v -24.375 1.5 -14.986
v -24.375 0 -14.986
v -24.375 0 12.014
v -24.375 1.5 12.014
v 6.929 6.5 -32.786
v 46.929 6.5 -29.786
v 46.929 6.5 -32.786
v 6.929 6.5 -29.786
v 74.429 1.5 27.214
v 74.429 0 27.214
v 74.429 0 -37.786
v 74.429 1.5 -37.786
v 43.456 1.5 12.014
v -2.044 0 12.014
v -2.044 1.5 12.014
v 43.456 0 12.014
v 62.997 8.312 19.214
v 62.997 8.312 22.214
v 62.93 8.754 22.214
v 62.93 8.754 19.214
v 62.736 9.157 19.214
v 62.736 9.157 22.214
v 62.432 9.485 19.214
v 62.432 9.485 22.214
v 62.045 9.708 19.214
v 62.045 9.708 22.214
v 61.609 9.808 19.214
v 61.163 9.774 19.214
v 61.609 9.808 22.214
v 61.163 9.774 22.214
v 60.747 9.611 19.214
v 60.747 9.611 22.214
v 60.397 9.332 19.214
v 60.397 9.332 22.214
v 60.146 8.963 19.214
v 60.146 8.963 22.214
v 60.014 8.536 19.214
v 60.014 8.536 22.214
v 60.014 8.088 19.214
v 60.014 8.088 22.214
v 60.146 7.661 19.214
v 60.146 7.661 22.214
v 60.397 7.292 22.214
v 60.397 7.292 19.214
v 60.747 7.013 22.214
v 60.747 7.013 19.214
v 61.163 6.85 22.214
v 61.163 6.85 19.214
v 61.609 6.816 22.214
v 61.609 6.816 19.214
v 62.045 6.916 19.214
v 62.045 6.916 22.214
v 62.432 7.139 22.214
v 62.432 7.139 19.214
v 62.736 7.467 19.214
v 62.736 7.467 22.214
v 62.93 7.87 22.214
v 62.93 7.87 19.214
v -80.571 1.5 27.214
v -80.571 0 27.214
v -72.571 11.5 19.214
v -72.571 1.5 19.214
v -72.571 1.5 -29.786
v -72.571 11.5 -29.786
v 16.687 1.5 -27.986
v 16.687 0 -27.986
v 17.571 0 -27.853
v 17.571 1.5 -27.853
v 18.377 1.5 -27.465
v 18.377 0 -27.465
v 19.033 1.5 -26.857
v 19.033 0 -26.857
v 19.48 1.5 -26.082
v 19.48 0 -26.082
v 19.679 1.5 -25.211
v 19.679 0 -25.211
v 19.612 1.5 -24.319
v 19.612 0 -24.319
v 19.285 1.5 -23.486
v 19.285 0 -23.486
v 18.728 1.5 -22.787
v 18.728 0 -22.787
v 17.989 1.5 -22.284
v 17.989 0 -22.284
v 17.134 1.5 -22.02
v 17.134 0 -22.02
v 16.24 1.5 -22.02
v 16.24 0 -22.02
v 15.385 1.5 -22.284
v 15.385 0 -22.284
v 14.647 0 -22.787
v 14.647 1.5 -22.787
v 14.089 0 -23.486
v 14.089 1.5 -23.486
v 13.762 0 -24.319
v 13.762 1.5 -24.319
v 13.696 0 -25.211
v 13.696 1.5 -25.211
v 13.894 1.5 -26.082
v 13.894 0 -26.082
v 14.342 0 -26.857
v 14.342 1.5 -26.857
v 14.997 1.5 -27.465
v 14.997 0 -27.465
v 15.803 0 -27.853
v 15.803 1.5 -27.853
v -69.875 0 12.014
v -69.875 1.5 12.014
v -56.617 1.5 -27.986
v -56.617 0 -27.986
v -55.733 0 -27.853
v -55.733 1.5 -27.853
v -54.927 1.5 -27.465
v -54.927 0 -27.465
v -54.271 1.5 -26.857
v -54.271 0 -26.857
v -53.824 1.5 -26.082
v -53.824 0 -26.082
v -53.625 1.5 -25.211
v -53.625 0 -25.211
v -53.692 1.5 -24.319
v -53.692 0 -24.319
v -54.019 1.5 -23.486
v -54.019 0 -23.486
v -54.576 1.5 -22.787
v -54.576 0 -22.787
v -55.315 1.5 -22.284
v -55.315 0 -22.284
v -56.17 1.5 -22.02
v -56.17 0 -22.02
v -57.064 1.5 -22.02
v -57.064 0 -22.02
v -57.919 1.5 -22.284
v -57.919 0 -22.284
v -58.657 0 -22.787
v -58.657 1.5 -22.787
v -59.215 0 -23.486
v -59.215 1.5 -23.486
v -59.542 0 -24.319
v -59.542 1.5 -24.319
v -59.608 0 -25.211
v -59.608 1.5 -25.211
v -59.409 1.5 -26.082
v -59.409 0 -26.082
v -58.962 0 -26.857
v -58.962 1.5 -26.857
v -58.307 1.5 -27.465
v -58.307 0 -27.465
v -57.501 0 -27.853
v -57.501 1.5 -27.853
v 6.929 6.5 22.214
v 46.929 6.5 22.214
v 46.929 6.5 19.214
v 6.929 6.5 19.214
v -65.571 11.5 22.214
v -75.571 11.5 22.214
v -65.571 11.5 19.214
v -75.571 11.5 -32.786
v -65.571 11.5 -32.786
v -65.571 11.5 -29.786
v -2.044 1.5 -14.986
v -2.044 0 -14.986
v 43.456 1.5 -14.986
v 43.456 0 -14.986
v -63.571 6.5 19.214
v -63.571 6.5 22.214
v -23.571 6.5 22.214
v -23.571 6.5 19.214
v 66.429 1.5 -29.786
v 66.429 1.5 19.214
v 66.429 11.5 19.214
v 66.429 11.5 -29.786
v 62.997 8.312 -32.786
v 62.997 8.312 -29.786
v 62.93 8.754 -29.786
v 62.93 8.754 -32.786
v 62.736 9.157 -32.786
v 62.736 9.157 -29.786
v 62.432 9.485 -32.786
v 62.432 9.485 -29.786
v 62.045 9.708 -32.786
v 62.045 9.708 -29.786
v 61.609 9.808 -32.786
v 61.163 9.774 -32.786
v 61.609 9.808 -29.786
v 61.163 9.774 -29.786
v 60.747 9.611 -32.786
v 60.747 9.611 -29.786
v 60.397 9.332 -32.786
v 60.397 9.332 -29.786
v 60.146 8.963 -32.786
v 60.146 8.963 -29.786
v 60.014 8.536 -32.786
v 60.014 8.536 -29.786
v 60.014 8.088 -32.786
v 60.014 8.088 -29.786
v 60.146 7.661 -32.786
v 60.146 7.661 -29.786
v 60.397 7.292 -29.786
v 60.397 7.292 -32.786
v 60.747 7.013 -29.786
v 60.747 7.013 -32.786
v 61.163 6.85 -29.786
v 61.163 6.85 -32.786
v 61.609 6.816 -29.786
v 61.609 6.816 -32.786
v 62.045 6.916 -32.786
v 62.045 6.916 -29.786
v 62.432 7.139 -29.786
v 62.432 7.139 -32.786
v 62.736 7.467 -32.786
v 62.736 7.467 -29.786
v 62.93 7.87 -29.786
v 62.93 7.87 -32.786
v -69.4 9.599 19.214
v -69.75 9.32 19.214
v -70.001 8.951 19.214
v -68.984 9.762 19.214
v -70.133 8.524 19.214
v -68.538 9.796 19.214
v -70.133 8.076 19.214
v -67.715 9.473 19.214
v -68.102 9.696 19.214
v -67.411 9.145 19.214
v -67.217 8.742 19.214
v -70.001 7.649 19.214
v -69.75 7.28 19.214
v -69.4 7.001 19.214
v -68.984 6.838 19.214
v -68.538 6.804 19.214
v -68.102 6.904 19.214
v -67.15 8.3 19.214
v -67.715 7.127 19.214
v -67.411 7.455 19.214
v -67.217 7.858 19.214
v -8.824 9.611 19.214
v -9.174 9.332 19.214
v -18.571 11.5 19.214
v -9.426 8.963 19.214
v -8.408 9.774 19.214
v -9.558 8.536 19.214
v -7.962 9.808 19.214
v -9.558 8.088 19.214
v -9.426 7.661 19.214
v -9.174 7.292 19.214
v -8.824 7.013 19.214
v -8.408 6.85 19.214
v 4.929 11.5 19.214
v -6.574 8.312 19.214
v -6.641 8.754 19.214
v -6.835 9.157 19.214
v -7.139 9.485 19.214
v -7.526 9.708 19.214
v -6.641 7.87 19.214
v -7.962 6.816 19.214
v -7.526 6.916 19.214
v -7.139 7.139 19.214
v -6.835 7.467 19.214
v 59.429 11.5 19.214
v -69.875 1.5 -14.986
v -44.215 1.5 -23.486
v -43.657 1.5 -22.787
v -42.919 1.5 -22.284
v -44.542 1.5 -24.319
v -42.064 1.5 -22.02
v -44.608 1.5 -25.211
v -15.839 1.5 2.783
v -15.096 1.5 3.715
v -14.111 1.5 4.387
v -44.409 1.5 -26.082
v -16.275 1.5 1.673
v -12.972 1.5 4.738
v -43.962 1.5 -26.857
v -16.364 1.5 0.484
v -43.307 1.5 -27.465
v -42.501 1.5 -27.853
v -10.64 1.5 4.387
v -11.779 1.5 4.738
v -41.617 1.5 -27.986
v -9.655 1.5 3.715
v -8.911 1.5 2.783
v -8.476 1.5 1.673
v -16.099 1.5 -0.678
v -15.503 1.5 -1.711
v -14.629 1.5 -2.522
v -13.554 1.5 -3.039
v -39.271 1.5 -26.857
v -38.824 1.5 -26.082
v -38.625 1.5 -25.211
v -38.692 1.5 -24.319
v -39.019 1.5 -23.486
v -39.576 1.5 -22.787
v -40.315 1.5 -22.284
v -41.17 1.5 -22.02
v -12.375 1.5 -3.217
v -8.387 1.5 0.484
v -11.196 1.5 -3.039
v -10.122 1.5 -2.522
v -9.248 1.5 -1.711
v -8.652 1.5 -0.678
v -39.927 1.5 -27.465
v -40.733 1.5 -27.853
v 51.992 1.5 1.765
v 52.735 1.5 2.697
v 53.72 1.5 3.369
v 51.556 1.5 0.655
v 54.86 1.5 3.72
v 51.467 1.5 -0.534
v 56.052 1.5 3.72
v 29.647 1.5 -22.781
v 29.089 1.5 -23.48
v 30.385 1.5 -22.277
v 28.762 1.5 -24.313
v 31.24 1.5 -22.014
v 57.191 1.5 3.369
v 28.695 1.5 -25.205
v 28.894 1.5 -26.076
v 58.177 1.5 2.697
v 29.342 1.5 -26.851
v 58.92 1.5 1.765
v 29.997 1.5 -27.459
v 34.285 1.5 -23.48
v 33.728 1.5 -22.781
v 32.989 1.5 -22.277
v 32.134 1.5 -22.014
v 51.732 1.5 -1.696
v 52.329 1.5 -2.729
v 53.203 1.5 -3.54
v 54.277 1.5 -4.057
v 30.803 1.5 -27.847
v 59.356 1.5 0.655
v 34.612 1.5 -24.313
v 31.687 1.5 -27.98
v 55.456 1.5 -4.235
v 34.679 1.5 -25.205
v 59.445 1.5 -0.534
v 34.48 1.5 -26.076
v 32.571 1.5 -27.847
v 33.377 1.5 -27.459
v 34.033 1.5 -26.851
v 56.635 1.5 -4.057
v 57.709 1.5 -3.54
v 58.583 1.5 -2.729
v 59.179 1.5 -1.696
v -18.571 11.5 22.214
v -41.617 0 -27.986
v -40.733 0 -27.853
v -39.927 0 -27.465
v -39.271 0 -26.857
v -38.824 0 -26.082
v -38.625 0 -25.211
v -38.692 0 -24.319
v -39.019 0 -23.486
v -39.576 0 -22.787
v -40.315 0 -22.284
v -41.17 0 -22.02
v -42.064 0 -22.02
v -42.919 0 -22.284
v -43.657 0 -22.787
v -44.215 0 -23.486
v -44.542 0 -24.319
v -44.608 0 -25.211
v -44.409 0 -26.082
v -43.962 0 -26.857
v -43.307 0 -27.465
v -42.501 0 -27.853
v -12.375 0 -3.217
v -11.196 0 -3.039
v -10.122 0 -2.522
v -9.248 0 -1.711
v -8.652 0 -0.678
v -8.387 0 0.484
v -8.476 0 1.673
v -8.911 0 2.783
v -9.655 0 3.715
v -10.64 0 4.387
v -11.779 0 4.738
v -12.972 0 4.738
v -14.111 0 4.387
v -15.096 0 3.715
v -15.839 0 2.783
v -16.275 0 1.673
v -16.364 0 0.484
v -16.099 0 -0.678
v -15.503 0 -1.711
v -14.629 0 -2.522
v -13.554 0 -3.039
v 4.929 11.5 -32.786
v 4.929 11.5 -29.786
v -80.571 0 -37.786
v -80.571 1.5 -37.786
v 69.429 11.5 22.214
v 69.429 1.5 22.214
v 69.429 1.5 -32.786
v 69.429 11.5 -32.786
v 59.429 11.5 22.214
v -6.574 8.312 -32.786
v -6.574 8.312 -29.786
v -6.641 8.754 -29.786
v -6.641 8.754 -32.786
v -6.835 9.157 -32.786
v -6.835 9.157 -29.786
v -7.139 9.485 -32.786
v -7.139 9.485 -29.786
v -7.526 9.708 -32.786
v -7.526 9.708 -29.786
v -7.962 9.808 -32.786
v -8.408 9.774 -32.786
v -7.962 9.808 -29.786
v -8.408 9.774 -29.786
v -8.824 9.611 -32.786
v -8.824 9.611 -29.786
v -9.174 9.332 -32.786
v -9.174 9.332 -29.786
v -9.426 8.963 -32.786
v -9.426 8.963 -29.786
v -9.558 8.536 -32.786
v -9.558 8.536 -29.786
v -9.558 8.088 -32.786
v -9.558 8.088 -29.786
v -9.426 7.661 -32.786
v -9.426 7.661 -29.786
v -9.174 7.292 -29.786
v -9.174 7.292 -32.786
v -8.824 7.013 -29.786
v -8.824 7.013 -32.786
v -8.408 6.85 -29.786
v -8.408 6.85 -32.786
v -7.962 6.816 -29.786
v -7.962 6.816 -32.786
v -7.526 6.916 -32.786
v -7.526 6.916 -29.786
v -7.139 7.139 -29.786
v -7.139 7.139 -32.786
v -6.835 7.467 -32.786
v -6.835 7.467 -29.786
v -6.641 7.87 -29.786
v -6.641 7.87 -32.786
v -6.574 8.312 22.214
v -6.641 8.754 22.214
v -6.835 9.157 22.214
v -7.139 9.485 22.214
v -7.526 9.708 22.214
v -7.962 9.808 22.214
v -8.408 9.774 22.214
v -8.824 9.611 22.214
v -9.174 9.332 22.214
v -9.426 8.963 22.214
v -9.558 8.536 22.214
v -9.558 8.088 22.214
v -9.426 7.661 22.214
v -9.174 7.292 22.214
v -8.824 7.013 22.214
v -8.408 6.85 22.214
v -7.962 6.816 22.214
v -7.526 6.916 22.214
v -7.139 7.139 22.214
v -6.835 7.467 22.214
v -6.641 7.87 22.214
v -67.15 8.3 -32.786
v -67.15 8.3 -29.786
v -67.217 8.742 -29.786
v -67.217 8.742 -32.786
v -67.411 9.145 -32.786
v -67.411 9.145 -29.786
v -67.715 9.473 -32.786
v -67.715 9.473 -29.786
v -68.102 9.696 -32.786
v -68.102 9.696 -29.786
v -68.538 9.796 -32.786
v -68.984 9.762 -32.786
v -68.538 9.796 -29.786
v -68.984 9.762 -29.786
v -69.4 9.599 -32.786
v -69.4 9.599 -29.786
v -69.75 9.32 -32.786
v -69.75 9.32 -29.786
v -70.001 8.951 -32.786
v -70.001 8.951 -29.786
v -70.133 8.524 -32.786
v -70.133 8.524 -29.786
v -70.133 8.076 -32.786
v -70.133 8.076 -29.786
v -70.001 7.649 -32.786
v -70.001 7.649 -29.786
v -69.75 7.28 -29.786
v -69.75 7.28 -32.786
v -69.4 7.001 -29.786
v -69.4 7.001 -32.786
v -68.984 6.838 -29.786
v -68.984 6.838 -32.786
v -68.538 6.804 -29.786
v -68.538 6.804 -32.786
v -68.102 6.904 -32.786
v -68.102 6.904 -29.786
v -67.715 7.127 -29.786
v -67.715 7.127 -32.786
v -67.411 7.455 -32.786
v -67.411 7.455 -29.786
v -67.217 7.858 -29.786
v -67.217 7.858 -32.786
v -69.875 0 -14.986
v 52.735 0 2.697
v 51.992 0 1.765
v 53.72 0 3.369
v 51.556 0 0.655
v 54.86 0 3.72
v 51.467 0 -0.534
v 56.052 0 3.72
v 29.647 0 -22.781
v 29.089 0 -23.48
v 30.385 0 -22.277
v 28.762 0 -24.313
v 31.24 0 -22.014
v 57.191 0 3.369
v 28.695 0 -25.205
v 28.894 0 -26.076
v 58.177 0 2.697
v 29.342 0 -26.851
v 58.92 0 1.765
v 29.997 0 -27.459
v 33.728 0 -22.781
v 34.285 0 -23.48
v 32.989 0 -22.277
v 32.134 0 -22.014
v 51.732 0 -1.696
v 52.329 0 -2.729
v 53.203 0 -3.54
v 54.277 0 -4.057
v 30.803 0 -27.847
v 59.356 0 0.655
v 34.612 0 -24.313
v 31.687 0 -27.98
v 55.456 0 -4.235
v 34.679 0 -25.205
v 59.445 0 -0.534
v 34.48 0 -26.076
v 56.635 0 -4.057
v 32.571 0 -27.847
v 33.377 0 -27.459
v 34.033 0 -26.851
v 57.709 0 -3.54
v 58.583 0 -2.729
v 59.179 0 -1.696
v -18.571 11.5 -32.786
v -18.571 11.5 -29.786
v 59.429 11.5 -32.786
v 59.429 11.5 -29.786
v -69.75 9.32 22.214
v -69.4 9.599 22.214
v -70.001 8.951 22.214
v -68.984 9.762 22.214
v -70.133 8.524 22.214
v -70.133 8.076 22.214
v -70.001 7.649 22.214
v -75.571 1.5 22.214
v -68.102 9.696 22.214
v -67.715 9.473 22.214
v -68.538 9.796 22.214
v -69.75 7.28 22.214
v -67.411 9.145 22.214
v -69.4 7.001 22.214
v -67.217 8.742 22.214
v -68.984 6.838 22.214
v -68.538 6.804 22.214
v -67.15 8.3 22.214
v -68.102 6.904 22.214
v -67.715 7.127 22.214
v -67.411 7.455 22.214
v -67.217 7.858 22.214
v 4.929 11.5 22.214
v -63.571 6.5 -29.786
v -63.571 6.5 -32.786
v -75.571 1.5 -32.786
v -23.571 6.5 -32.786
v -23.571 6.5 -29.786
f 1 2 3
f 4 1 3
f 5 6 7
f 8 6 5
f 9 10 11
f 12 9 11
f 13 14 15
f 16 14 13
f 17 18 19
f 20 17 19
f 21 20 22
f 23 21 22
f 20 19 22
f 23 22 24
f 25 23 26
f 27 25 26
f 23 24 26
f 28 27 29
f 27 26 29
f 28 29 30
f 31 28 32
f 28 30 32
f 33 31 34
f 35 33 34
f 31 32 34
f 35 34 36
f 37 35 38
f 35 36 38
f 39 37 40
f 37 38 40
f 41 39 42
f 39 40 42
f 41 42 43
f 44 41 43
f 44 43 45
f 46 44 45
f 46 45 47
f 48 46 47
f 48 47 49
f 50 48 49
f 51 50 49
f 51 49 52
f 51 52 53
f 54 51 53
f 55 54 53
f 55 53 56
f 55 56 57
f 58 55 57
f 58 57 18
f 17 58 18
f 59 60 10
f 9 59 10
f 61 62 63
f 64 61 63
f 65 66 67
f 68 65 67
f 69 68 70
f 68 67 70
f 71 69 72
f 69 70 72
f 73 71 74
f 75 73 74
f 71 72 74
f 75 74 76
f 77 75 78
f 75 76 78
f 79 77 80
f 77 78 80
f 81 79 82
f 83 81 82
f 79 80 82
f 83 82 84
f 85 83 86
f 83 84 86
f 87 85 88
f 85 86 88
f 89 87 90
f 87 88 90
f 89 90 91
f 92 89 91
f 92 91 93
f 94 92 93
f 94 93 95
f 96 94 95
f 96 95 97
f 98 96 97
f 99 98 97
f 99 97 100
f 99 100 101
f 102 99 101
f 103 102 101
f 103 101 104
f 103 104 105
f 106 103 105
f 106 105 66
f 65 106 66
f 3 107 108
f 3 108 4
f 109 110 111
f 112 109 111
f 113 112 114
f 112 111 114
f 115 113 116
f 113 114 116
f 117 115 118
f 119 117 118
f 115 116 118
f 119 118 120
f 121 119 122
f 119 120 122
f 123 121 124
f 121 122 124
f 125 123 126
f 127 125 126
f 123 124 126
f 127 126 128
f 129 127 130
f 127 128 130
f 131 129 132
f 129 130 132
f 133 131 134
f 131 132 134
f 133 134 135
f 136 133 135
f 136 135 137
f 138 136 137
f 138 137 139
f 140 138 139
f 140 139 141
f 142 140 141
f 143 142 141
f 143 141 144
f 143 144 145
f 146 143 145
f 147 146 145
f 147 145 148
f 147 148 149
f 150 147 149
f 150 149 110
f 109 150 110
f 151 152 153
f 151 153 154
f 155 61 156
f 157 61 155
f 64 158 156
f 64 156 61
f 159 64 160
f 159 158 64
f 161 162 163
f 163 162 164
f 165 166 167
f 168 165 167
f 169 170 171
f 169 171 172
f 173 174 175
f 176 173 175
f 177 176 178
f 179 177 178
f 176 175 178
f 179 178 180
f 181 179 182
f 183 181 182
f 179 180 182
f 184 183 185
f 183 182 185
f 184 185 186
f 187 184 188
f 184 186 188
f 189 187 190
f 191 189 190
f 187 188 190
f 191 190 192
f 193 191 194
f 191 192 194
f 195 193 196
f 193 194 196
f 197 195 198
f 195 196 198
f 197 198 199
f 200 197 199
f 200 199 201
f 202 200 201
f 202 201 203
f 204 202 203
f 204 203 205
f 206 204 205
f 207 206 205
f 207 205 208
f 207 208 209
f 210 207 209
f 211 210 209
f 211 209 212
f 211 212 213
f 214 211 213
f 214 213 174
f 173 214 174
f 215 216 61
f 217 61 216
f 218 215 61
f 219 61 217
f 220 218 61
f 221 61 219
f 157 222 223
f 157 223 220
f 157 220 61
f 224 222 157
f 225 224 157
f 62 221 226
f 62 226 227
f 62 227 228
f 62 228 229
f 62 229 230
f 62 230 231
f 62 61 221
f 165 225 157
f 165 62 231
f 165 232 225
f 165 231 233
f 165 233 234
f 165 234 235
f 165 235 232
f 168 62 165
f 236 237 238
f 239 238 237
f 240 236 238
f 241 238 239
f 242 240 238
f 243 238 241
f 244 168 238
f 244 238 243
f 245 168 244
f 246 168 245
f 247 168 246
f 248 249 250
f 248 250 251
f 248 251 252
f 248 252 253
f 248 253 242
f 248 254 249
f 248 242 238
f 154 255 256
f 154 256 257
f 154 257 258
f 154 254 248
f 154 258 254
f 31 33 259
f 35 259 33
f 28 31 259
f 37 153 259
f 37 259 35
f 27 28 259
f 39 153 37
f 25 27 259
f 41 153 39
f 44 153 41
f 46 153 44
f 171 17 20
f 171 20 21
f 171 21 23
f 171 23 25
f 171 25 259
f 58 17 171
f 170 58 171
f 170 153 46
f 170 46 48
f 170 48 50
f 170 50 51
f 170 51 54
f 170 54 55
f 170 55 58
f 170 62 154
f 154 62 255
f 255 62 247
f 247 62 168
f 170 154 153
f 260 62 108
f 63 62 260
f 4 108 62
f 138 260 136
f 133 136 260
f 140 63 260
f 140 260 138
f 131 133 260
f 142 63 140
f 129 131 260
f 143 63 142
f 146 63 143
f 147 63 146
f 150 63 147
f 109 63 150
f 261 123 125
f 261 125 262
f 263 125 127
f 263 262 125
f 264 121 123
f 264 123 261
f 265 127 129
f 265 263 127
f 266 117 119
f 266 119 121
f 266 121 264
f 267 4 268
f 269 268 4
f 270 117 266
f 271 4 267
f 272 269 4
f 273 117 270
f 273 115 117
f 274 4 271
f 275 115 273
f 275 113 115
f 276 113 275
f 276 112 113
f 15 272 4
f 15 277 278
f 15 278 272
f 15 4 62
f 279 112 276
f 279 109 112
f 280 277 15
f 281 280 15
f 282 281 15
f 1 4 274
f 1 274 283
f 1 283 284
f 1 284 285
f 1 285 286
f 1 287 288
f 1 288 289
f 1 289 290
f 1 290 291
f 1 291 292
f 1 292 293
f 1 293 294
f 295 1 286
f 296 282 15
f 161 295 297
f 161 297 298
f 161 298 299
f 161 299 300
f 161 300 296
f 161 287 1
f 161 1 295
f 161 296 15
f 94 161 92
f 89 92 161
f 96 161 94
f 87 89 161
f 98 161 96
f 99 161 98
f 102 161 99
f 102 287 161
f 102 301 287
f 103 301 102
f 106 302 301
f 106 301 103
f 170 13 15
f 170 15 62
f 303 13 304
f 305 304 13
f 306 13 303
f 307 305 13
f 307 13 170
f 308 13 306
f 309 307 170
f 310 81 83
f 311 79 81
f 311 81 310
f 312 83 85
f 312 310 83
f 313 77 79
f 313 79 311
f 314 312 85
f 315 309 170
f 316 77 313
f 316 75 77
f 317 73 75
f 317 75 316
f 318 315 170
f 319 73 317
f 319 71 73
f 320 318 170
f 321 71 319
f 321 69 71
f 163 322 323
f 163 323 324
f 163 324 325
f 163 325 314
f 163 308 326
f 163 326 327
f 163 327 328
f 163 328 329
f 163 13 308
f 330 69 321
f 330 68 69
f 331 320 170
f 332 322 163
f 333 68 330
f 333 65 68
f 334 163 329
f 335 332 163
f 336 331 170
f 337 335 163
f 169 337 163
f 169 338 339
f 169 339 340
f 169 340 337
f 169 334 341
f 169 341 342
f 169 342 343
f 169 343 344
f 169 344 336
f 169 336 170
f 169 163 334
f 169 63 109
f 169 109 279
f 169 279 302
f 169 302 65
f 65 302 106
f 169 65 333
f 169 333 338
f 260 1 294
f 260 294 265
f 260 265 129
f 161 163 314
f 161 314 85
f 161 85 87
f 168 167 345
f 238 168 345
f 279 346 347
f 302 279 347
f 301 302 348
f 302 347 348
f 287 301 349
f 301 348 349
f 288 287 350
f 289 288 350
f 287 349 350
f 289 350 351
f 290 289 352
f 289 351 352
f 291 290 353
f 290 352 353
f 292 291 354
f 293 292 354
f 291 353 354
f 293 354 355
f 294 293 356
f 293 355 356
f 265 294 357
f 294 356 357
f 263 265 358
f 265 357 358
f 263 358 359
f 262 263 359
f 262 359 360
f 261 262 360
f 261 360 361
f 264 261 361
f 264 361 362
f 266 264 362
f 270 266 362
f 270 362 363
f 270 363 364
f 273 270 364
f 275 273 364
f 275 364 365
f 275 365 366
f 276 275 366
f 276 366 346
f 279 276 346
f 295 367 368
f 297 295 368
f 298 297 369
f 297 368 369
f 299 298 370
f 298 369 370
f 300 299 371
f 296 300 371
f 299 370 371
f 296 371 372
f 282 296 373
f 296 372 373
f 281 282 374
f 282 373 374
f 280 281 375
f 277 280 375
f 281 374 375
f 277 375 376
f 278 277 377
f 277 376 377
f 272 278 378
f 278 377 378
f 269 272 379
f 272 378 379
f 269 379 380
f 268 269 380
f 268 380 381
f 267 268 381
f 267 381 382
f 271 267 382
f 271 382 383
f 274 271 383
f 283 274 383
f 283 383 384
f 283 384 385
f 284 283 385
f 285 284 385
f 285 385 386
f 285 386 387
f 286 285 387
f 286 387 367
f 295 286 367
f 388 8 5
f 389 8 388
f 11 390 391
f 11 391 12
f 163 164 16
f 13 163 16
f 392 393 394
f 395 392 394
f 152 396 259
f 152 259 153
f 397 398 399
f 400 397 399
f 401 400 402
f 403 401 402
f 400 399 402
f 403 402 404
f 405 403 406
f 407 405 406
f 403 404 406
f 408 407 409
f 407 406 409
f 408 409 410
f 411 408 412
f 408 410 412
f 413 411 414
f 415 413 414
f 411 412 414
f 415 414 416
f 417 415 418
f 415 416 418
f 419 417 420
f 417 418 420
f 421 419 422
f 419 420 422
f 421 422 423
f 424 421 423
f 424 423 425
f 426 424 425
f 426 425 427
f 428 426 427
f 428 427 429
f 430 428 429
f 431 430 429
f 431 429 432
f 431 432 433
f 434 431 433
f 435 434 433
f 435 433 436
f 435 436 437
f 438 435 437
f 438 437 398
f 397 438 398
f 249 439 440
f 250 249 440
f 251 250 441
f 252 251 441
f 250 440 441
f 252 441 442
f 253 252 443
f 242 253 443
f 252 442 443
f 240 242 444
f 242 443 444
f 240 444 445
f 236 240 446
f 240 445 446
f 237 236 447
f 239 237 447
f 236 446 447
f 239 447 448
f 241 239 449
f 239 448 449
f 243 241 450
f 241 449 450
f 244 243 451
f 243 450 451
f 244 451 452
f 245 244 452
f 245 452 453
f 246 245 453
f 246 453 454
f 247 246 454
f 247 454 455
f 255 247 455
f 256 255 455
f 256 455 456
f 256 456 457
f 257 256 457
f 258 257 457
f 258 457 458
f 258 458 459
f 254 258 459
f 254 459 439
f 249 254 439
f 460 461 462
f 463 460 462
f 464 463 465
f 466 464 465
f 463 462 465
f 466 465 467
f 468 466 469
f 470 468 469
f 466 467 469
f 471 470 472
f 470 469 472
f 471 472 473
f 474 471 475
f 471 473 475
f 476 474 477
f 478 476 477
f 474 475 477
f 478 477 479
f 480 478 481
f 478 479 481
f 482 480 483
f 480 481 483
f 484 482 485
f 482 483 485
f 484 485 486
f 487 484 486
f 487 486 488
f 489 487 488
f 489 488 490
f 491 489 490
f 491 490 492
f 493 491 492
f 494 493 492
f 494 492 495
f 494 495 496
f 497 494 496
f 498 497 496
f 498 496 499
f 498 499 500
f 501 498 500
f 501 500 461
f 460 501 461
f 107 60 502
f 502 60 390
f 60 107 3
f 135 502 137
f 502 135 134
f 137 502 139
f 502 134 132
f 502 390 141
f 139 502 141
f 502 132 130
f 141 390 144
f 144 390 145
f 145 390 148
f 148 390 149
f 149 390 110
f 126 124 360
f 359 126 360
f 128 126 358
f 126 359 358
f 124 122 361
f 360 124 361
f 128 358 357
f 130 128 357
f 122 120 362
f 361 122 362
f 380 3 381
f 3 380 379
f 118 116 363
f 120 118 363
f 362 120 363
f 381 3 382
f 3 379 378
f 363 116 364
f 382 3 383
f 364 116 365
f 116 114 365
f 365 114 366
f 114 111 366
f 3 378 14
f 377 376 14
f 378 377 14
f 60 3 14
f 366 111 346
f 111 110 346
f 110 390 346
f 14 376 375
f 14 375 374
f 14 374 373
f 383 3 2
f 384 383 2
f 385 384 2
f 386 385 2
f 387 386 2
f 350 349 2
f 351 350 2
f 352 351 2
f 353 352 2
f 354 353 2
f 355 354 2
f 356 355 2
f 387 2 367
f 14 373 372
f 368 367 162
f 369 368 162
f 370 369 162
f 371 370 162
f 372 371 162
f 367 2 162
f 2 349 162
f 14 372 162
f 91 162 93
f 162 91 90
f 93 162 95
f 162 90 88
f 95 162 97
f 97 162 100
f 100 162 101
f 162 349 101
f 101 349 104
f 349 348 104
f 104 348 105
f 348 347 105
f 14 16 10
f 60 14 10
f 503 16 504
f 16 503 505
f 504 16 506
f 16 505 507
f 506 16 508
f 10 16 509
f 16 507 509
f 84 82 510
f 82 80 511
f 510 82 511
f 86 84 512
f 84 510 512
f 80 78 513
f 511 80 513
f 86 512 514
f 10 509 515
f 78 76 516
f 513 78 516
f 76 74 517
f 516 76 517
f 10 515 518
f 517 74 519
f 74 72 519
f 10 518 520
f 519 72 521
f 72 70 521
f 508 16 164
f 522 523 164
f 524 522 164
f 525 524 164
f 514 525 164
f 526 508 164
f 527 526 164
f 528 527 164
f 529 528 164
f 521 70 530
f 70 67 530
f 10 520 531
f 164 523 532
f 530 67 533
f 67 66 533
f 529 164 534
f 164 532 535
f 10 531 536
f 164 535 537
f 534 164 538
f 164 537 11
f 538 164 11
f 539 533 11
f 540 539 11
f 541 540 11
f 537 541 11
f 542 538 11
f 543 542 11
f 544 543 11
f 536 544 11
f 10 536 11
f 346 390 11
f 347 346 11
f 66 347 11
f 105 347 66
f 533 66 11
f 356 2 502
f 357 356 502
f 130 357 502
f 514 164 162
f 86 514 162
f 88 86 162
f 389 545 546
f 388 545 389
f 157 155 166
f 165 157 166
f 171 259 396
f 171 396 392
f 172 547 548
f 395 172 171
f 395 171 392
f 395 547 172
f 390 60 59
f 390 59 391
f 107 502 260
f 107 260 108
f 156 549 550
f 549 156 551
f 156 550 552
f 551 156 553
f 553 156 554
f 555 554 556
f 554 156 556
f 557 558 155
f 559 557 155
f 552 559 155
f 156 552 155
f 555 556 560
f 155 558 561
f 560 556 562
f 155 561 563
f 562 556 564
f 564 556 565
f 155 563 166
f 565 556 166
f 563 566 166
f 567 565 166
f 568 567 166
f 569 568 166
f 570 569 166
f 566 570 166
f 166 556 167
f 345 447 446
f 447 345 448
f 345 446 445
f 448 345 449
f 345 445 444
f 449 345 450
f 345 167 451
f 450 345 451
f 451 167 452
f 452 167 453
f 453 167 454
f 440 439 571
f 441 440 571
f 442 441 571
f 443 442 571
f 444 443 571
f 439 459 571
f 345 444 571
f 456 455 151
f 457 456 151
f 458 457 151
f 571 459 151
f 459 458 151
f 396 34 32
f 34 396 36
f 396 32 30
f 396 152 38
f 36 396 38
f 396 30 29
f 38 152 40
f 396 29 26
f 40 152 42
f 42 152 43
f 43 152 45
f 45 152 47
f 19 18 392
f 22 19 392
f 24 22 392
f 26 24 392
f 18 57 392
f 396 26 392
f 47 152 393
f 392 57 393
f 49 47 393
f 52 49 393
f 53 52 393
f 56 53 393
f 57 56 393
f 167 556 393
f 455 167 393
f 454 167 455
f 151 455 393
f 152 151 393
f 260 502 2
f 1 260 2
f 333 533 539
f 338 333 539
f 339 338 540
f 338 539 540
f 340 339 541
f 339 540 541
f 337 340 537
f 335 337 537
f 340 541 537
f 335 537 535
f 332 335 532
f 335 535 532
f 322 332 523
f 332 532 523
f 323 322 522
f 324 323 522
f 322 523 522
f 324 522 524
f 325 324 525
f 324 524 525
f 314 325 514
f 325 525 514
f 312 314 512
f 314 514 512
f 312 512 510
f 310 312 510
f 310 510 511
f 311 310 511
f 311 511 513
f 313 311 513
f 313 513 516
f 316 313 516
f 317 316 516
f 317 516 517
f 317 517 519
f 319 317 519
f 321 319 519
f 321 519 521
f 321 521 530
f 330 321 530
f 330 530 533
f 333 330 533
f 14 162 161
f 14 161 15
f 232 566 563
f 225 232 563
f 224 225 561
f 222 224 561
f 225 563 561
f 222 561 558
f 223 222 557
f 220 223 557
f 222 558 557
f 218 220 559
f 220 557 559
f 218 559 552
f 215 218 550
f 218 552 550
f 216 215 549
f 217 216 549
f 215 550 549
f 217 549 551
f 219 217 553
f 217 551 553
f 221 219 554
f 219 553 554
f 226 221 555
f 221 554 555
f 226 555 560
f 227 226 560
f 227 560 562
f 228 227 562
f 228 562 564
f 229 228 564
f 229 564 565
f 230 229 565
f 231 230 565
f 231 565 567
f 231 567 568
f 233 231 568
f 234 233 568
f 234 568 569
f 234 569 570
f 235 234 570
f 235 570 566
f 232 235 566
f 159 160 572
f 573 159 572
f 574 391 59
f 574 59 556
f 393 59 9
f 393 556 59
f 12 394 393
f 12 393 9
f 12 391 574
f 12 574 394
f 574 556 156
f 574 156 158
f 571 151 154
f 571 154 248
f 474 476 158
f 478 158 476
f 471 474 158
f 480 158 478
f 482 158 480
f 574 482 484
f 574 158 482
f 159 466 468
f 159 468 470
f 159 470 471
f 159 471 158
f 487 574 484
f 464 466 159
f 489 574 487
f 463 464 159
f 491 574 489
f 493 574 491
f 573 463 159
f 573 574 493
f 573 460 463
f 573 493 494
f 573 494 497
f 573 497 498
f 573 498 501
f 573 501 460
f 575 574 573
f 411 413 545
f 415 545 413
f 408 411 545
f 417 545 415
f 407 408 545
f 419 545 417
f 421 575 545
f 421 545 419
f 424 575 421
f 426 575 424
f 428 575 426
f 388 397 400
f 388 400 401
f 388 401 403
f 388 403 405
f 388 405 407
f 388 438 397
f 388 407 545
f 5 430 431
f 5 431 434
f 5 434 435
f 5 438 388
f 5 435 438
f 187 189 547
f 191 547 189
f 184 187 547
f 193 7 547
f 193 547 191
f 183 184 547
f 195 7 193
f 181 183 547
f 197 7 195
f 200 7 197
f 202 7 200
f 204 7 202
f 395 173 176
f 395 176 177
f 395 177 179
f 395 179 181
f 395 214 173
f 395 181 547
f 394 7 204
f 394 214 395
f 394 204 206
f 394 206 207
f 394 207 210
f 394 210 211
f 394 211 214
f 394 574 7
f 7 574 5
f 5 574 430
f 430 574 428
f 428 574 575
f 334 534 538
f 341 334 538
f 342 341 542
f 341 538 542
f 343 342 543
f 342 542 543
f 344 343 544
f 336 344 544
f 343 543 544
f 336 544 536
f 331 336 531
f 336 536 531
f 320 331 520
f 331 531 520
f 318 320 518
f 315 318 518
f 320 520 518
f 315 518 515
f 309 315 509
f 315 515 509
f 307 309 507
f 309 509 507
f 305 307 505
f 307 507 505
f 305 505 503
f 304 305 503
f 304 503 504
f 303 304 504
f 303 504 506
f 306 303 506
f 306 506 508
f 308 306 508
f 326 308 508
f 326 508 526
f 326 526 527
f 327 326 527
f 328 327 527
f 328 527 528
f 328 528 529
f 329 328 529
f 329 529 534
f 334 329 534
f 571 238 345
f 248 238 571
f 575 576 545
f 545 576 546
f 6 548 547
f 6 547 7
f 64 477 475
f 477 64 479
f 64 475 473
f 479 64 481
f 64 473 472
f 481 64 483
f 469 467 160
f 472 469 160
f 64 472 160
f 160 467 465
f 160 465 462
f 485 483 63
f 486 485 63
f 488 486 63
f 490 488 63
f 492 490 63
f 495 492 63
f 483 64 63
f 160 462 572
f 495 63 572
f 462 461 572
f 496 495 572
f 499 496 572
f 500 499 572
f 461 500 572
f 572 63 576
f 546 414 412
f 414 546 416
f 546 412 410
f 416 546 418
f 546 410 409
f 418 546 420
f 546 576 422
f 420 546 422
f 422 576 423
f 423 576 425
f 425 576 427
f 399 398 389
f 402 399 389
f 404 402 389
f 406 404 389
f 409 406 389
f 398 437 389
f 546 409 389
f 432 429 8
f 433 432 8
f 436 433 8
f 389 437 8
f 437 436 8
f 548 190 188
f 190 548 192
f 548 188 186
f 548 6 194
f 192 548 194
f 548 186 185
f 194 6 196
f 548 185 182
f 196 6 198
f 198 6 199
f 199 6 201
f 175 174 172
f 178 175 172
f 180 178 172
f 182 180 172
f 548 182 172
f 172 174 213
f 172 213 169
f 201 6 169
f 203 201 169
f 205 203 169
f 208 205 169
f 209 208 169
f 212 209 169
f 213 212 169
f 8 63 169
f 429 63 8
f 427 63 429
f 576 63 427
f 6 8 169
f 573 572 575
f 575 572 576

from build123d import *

# Parameters (mm, degrees)
SKETCH1_W           = 155
SKETCH1_H           = 65
BOSS_EXTRUDE1_DEPTH = 1.5
SKETCH2_W           = 145
SKETCH2_H           = 55
SKETCH2_W_2         = 139
SKETCH2_H_2         = 49
BOSS_EXTRUDE2_DEPTH = 10
CUT_EXTRUDE1_DEPTH  = 91
SKETCH5_R           = 3
SKETCH5_R_2         = 4
SKETCH5_W           = 45.5
SKETCH5_H           = 27
CUT_EXTRUDE2_DEPTH  = 91
SKETCH6_R           = 1.5
CUT_EXTRUDE3_DEPTH  = 91


with BuildPart() as part:
    # Sketch1 → Boss-Extrude1 (new body)
    with BuildSketch(Plane(origin=(0, 0, 0), x_dir=(1, 0, 0), z_dir=(0, 1, 0))):
        with Locations((-3.071428571, 5.285714286)):
            Rectangle(SKETCH1_W, SKETCH1_H)
    extrude(amount=BOSS_EXTRUDE1_DEPTH)

    # Sketch2 → Boss-Extrude2 (add)
    with BuildSketch(Plane(origin=(0, 1.5, 0), x_dir=(1, 0, 0), z_dir=(0, 1, 0))):
        with Locations((-3.071428571, 5.285714286)):
            Rectangle(SKETCH2_W, SKETCH2_H)
        with Locations((-3.071428571, 5.285714286)):
            Rectangle(SKETCH2_W_2, SKETCH2_H_2, mode=Mode.SUBTRACT)
    extrude(amount=BOSS_EXTRUDE2_DEPTH)

    # Sketch4 → Cut-Extrude1 (cut)
    with BuildSketch(Plane.XY.offset(22.214285714)):
        Polygon((-65.571428571, 11.5), (-63.571428571, 6.5), (-23.571428571, 6.5), (-18.571428571, 11.5), align=None)
        Polygon((4.928571429, 11.5), (59.428571429, 11.5), (46.928571429, 6.5), (6.928571429, 6.5), align=None)
    extrude(amount=-CUT_EXTRUDE1_DEPTH, mode=Mode.SUBTRACT)

    # Sketch5 → Cut-Extrude2 (cut)
    with BuildSketch(Plane.XZ):
        with Locations(Location((16.687112177, -24.986454546, 0), (0, 0, 270))):
            Circle(SKETCH5_R)
        with Locations(Location((31.687110951, -24.980390104, 0), (0, 0, 270))):
            Circle(SKETCH5_R)
        with Locations(Location((55.455936184, -0.234986803, 0), (0, 0, 270))):
            Circle(SKETCH5_R_2)
        with Locations(Location((-12.375354301, 0.783116326, 0), (0, 0, 270))):
            Circle(SKETCH5_R_2)
        with Locations(Location((-56.616849976, -24.986454546, 0), (0, 0, 270))):
            Circle(SKETCH5_R)
        with Locations(Location((-41.616849976, -24.986454546, 0), (0, 0, 270))):
            Circle(SKETCH5_R)
        with Locations((20.705936184, -1.486454546)):
            Rectangle(SKETCH5_W, SKETCH5_H)
        with Locations((-47.125354301, -1.486454546)):
            Rectangle(SKETCH5_W, SKETCH5_H)
    extrude(amount=-CUT_EXTRUDE2_DEPTH, mode=Mode.SUBTRACT)

    # Sketch6 → Cut-Extrude3 (cut)
    with BuildSketch(Plane.XY.offset(22.214285714)):
        with Locations((-8.074390062, 8.312033368)):
            Circle(SKETCH6_R)
        with Locations((61.496987575, 8.312033368)):
            Circle(SKETCH6_R)
        with Locations((-68.65, 8.3)):
            Circle(SKETCH6_R)
    extrude(amount=-CUT_EXTRUDE3_DEPTH, mode=Mode.SUBTRACT)


solid = part.part
